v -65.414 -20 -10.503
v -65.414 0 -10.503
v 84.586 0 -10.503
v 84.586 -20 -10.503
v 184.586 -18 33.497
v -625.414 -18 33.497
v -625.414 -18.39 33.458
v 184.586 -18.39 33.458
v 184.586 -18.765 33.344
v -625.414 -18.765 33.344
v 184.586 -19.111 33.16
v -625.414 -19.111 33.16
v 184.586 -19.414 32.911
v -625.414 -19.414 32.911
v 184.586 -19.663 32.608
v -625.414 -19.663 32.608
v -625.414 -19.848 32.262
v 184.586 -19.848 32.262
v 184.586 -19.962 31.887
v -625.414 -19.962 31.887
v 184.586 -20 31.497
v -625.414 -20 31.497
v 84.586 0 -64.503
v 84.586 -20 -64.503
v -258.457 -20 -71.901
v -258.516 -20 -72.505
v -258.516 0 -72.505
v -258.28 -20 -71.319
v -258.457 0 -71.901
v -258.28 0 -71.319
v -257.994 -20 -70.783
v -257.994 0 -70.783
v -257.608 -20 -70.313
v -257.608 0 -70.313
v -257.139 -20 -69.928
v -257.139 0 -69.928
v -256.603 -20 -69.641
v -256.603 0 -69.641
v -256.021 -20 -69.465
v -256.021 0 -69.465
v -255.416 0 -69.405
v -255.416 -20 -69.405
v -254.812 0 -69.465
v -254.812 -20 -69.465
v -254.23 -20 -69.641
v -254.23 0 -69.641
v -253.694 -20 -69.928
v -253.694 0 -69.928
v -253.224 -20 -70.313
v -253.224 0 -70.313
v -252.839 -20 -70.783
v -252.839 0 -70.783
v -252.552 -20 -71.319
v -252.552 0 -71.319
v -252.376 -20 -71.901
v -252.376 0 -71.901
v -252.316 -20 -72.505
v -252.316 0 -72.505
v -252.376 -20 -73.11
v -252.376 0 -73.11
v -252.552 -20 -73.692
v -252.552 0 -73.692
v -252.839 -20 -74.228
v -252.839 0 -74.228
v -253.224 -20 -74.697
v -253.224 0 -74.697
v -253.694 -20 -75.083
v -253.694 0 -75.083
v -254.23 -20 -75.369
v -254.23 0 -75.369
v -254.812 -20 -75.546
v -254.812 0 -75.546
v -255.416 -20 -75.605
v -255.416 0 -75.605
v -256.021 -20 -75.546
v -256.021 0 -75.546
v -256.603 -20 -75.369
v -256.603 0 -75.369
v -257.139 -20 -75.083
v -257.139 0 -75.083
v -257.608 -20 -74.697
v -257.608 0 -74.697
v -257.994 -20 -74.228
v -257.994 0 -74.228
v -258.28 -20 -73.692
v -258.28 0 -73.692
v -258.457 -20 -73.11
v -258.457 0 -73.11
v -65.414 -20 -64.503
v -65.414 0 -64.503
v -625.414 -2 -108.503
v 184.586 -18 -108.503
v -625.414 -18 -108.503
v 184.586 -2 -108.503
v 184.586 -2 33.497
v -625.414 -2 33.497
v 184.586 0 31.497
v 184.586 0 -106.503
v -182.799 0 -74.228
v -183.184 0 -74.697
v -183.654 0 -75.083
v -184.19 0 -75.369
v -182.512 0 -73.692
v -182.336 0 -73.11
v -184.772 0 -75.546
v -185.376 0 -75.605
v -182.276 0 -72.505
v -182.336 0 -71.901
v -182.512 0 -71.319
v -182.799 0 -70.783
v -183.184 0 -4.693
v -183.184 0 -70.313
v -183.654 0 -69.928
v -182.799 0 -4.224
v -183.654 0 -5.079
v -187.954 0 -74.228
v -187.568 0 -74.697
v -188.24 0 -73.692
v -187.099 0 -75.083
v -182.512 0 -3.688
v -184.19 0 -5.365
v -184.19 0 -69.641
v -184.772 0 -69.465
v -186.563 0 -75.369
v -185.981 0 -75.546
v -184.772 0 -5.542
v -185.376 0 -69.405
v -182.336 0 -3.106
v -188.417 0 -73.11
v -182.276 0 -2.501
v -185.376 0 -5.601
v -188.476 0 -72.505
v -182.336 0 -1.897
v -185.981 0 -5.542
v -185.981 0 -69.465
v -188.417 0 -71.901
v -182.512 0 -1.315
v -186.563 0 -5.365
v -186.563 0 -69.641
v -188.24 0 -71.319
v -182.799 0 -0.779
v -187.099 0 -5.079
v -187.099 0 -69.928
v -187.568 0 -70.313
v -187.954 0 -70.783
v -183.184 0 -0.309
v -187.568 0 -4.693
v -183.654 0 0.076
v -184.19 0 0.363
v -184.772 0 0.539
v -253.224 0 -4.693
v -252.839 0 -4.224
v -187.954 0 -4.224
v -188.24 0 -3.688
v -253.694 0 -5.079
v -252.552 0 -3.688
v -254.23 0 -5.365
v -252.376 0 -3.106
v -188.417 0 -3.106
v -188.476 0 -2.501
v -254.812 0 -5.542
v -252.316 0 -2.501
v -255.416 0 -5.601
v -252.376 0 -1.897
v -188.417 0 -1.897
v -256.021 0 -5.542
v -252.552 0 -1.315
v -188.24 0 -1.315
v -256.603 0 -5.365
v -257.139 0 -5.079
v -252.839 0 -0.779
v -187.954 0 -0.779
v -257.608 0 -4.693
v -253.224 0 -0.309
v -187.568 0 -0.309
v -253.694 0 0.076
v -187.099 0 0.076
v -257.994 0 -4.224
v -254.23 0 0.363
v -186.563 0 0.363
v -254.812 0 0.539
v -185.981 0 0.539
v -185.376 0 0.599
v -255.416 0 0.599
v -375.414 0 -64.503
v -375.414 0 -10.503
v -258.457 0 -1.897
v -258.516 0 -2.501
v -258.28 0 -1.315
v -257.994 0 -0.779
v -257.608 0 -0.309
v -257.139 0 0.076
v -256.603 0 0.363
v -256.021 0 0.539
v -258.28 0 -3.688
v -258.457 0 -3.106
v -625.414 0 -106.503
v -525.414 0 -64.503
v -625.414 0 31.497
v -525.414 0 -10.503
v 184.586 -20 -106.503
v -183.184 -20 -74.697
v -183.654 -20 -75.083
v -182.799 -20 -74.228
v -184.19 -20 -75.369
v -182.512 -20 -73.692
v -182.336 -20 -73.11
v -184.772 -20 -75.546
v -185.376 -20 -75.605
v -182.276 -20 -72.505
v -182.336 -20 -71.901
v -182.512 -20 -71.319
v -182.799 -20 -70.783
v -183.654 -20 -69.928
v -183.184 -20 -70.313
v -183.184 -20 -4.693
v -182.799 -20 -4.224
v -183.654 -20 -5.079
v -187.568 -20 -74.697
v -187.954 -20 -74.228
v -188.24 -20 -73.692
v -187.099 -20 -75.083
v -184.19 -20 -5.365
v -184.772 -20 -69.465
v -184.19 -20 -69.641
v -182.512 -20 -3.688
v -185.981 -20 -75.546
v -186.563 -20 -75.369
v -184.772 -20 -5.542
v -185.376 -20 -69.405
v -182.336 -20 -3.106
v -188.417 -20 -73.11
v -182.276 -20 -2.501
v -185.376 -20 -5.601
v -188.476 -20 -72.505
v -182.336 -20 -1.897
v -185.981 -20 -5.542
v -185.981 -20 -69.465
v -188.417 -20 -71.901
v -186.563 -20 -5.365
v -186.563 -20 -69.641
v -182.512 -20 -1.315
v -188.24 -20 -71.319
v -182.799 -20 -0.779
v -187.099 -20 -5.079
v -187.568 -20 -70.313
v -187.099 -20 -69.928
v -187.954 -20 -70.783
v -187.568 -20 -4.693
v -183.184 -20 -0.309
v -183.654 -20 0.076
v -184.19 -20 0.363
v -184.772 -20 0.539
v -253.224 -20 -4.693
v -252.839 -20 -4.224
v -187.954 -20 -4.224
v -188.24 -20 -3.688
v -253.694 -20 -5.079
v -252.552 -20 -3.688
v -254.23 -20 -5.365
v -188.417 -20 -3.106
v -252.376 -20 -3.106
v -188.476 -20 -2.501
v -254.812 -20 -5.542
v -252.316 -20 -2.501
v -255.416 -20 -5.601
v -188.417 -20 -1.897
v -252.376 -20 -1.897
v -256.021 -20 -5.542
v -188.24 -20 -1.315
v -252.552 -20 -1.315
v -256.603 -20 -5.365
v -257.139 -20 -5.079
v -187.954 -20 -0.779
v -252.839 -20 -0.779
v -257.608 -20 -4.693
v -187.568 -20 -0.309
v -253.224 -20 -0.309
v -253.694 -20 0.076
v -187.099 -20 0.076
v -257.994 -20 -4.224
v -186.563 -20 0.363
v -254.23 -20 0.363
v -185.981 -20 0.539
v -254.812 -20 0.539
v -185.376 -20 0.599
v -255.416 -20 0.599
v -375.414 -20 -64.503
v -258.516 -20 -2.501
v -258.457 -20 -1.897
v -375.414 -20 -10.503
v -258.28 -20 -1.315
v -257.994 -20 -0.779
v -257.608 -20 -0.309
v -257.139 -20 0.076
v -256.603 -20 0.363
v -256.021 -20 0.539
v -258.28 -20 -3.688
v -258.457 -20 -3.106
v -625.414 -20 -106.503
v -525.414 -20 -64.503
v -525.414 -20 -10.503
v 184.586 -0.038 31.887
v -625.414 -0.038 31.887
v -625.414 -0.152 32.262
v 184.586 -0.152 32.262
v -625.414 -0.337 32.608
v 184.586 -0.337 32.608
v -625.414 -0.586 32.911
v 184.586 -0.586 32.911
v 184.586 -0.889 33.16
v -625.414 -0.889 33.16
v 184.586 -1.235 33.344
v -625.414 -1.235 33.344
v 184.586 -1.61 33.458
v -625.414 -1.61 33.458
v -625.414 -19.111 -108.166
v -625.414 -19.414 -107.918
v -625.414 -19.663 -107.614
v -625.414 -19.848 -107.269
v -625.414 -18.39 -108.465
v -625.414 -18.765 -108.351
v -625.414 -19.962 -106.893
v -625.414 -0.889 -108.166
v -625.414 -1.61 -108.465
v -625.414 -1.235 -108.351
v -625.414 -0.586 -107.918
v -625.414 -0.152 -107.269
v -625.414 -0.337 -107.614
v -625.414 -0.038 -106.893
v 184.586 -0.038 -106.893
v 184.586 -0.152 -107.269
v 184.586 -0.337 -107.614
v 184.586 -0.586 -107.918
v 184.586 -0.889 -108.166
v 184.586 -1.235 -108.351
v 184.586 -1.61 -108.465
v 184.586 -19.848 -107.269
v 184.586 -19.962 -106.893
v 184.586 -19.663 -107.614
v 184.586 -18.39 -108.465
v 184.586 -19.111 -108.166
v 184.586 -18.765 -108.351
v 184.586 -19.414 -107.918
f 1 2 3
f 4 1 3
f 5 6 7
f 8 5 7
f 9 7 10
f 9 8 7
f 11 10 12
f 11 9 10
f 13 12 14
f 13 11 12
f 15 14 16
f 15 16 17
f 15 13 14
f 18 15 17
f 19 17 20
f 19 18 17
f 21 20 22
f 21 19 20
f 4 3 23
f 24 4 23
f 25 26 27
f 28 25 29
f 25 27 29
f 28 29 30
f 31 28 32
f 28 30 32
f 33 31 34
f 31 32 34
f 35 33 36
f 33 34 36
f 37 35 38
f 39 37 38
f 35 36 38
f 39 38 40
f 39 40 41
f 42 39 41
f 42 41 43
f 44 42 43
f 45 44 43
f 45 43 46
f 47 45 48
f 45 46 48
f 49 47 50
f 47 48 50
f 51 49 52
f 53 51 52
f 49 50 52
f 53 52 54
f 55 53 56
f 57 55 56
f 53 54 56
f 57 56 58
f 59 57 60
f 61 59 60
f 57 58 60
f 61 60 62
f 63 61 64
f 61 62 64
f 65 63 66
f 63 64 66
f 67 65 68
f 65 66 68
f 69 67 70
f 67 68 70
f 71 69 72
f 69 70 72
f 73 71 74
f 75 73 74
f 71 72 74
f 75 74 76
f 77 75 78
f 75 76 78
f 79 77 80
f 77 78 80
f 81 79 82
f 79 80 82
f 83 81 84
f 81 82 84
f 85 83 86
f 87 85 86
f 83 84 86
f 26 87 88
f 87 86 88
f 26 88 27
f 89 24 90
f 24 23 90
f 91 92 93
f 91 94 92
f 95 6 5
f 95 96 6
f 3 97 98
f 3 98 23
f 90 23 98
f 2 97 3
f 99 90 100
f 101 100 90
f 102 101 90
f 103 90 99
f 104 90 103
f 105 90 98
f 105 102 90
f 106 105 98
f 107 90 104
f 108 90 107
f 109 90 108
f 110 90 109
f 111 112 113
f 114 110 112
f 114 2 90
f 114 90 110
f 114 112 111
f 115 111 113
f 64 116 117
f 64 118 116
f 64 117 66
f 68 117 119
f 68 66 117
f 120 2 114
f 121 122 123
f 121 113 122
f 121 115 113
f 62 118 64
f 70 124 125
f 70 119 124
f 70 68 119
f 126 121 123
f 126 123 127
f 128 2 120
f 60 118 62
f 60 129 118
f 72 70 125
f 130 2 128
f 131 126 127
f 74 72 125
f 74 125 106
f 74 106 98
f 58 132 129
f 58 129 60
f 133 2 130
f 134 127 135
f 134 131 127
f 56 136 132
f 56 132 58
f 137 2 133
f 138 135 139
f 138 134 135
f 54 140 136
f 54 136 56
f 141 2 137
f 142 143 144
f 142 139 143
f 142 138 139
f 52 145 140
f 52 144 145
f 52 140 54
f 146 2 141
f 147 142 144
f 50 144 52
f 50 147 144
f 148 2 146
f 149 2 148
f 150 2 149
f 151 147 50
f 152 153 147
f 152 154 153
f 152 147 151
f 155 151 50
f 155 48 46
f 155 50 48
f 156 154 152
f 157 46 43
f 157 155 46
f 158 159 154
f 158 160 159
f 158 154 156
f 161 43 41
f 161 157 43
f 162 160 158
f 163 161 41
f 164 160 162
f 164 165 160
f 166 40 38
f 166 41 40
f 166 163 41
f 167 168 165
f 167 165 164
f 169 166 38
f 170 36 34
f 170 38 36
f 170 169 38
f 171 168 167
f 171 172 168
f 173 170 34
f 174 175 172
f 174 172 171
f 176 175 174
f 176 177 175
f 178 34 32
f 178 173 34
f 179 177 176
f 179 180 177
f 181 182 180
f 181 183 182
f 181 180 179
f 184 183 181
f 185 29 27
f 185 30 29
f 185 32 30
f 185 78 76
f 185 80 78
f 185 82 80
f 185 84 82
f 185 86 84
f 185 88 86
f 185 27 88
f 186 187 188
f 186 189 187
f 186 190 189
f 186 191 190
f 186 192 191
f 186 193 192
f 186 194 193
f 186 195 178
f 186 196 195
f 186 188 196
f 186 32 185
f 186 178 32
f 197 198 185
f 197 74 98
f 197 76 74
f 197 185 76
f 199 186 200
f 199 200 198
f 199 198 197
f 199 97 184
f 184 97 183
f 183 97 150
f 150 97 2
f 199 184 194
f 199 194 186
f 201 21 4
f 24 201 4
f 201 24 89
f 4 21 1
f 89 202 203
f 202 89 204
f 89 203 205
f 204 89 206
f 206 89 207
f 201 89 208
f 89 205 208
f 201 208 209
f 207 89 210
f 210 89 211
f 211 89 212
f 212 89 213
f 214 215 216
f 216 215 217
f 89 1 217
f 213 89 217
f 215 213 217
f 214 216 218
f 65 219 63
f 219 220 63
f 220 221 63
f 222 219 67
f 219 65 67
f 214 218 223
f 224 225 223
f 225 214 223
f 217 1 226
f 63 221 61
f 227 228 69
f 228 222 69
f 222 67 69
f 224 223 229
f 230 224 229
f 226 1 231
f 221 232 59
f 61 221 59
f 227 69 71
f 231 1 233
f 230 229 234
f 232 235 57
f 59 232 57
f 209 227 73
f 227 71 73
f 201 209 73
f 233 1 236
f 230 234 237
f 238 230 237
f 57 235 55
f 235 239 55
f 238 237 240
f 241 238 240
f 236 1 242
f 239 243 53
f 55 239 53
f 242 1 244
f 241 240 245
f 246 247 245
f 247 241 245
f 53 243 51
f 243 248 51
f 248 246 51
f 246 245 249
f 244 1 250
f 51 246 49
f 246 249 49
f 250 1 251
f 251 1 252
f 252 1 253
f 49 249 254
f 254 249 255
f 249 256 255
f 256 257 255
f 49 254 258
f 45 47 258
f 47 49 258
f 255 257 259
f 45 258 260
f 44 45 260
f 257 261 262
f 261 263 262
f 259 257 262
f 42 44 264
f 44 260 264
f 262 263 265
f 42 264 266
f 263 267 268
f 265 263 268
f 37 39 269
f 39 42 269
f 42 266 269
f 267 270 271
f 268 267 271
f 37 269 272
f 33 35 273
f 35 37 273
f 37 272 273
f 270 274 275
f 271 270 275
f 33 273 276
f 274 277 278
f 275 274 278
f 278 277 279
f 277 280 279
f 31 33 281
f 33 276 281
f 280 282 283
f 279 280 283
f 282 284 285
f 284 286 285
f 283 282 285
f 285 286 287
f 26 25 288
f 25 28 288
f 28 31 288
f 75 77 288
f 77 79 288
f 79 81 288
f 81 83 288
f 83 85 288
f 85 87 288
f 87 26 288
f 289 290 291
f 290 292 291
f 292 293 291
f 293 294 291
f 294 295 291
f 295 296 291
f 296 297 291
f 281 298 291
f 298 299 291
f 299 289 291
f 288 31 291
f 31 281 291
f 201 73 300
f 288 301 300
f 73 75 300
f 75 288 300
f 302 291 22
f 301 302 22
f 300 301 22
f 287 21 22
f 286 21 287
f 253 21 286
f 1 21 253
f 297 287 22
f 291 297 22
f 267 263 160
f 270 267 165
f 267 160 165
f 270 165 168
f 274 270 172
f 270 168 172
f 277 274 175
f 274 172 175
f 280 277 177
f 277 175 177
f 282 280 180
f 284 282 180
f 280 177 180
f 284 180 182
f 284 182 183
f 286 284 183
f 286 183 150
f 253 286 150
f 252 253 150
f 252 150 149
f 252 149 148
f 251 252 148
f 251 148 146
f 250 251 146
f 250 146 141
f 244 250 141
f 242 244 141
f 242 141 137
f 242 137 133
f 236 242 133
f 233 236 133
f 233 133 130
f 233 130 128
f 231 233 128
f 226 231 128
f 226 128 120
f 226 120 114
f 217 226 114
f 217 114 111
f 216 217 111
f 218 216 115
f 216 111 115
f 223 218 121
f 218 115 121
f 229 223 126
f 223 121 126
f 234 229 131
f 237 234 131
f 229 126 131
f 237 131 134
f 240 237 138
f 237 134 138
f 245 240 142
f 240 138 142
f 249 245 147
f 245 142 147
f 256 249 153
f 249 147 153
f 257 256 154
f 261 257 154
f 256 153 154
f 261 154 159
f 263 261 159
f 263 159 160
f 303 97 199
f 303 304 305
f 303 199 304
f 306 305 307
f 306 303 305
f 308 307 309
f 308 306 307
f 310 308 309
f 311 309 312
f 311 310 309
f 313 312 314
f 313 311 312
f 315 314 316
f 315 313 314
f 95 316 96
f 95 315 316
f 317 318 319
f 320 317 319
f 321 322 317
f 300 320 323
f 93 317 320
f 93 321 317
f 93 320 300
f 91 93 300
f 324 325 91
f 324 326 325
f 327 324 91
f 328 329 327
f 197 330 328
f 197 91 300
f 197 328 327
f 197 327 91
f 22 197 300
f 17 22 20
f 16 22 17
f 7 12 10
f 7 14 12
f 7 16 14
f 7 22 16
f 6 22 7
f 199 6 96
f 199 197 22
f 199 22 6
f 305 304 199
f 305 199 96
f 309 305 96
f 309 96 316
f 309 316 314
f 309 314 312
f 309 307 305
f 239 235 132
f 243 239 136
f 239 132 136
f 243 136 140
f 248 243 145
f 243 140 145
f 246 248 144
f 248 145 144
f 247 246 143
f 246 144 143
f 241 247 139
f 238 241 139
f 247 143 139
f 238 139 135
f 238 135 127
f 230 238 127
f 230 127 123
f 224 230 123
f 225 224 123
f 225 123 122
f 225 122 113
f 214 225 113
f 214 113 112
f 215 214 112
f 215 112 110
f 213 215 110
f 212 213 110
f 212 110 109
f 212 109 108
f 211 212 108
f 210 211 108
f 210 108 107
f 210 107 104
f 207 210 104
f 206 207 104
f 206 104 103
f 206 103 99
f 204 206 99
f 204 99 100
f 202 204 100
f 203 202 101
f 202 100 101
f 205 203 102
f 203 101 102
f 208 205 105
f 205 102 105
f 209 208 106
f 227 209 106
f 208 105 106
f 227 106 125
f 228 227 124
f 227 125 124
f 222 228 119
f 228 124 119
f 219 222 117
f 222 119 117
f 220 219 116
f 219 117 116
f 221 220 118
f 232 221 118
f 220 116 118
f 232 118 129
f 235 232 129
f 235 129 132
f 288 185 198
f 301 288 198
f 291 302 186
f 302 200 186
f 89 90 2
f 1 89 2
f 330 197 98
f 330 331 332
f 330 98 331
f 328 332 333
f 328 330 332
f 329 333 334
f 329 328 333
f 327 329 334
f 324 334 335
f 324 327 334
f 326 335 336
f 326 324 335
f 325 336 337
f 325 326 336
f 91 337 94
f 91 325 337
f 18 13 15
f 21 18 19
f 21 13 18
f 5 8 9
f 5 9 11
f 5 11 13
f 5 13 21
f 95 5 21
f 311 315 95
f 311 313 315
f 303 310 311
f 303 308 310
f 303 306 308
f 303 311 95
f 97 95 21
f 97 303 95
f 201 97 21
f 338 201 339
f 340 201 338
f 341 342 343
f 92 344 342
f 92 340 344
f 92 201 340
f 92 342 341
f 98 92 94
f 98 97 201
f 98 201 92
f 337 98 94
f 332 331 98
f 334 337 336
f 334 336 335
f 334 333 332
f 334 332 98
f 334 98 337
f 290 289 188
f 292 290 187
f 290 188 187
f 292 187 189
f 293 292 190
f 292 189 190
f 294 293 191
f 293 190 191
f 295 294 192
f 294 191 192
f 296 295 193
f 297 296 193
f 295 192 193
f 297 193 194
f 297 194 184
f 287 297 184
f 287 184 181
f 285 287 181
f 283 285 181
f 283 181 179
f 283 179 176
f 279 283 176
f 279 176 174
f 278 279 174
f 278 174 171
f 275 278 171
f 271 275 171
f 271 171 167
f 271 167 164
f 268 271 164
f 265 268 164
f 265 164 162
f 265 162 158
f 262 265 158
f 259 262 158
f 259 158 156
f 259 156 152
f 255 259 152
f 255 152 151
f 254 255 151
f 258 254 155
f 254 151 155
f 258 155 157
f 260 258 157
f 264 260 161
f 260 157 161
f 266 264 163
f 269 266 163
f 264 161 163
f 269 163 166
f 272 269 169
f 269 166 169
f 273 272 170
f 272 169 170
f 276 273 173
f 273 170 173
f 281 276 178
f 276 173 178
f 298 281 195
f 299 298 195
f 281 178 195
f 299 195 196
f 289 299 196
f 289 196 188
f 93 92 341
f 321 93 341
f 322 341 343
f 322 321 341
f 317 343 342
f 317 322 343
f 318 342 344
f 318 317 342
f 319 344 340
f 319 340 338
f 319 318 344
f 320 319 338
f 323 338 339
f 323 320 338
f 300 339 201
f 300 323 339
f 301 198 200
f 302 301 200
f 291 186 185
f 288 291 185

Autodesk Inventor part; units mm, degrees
ref_plane "YZ Plane" through (0, 0, 0) normal (1, 0, 0) x (0, 1, 0)
ref_plane "XZ Plane" through (0, 0, 0) normal (0, 1, 0) x (-1, 0, 0)
ref_plane "XY Plane" through (0, 0, 0) normal (0, 0, 1) x (1, 0, 0)
sketch "Skizze1" plane through (0, 0, 0) normal (0, 1, 0) x (-1, 0, 0)
  line L0 (625.4144, 33.4967) -> (-184.5856, 33.4967)
  line L1 (-184.5856, 33.4967) -> (-184.5856, -108.5033)
  line L2 (-184.5856, -108.5033) -> (625.4144, -108.5033)
  line L3 (625.4144, -108.5033) -> (625.4144, 33.4967)
  line L4 (525.4144, -10.5033) -> (375.4144, -10.5033)
  line L5 (375.4144, -10.5033) -> (375.4144, -64.5033)
  line L6 (375.4144, -64.5033) -> (525.4144, -64.5033)
  line L7 (525.4144, -64.5033) -> (525.4144, -10.5033)
  line L8 (65.4144, -10.5033) -> (-84.5856, -10.5033)
  line L9 (-84.5856, -10.5033) -> (-84.5856, -64.5033)
  line L10 (-84.5856, -64.5033) -> (65.4144, -64.5033)
  line L11 (65.4144, -64.5033) -> (65.4144, -10.5033)
  circle A0 centre (255.4164, -2.5013) radius 3.1
  circle A1 centre (185.3764, -2.5013) radius 3.1
  circle A2 centre (255.4164, -72.5053) radius 3.1
  circle A3 centre (185.3764, -72.5053) radius 3.1
  point P0 (0, 0)
  dimension "d0" = 142
  dimension "d1" = 810
  dimension "d2" = 54
  dimension "d3" = 54
  dimension "d4" = 150
  dimension "d5" = 150
  dimension "d6" = 44
  dimension "d7" = 44
  dimension "d8" = 100
  dimension "d9" = 100
  dimension "d10" = 6.2
  dimension "d11" = 6.2
  dimension "d12" = 6.2
  dimension "d13" = 6.2
  dimension "d14" = 70.004
  dimension "d15" = 0
  dimension "d16" = 0
  dimension "d17" = 70.04
  dimension "d18" = 0
  dimension "d19" = 0
  dimension "d20" = 35.998
  dimension "d21" = 369.998
extrude "Extrusion1" add sketch "Skizze1" against normal blind 20
fillet "Rundung1" radius 2 4 edges at (-220.4144, -20, 33.4967) (-220.4144, 0, 33.4967) (-220.4144, -20, -108.5033) (-220.4144, 0, -108.5033)
properties part number "VerstaerkungHintenMitte"
